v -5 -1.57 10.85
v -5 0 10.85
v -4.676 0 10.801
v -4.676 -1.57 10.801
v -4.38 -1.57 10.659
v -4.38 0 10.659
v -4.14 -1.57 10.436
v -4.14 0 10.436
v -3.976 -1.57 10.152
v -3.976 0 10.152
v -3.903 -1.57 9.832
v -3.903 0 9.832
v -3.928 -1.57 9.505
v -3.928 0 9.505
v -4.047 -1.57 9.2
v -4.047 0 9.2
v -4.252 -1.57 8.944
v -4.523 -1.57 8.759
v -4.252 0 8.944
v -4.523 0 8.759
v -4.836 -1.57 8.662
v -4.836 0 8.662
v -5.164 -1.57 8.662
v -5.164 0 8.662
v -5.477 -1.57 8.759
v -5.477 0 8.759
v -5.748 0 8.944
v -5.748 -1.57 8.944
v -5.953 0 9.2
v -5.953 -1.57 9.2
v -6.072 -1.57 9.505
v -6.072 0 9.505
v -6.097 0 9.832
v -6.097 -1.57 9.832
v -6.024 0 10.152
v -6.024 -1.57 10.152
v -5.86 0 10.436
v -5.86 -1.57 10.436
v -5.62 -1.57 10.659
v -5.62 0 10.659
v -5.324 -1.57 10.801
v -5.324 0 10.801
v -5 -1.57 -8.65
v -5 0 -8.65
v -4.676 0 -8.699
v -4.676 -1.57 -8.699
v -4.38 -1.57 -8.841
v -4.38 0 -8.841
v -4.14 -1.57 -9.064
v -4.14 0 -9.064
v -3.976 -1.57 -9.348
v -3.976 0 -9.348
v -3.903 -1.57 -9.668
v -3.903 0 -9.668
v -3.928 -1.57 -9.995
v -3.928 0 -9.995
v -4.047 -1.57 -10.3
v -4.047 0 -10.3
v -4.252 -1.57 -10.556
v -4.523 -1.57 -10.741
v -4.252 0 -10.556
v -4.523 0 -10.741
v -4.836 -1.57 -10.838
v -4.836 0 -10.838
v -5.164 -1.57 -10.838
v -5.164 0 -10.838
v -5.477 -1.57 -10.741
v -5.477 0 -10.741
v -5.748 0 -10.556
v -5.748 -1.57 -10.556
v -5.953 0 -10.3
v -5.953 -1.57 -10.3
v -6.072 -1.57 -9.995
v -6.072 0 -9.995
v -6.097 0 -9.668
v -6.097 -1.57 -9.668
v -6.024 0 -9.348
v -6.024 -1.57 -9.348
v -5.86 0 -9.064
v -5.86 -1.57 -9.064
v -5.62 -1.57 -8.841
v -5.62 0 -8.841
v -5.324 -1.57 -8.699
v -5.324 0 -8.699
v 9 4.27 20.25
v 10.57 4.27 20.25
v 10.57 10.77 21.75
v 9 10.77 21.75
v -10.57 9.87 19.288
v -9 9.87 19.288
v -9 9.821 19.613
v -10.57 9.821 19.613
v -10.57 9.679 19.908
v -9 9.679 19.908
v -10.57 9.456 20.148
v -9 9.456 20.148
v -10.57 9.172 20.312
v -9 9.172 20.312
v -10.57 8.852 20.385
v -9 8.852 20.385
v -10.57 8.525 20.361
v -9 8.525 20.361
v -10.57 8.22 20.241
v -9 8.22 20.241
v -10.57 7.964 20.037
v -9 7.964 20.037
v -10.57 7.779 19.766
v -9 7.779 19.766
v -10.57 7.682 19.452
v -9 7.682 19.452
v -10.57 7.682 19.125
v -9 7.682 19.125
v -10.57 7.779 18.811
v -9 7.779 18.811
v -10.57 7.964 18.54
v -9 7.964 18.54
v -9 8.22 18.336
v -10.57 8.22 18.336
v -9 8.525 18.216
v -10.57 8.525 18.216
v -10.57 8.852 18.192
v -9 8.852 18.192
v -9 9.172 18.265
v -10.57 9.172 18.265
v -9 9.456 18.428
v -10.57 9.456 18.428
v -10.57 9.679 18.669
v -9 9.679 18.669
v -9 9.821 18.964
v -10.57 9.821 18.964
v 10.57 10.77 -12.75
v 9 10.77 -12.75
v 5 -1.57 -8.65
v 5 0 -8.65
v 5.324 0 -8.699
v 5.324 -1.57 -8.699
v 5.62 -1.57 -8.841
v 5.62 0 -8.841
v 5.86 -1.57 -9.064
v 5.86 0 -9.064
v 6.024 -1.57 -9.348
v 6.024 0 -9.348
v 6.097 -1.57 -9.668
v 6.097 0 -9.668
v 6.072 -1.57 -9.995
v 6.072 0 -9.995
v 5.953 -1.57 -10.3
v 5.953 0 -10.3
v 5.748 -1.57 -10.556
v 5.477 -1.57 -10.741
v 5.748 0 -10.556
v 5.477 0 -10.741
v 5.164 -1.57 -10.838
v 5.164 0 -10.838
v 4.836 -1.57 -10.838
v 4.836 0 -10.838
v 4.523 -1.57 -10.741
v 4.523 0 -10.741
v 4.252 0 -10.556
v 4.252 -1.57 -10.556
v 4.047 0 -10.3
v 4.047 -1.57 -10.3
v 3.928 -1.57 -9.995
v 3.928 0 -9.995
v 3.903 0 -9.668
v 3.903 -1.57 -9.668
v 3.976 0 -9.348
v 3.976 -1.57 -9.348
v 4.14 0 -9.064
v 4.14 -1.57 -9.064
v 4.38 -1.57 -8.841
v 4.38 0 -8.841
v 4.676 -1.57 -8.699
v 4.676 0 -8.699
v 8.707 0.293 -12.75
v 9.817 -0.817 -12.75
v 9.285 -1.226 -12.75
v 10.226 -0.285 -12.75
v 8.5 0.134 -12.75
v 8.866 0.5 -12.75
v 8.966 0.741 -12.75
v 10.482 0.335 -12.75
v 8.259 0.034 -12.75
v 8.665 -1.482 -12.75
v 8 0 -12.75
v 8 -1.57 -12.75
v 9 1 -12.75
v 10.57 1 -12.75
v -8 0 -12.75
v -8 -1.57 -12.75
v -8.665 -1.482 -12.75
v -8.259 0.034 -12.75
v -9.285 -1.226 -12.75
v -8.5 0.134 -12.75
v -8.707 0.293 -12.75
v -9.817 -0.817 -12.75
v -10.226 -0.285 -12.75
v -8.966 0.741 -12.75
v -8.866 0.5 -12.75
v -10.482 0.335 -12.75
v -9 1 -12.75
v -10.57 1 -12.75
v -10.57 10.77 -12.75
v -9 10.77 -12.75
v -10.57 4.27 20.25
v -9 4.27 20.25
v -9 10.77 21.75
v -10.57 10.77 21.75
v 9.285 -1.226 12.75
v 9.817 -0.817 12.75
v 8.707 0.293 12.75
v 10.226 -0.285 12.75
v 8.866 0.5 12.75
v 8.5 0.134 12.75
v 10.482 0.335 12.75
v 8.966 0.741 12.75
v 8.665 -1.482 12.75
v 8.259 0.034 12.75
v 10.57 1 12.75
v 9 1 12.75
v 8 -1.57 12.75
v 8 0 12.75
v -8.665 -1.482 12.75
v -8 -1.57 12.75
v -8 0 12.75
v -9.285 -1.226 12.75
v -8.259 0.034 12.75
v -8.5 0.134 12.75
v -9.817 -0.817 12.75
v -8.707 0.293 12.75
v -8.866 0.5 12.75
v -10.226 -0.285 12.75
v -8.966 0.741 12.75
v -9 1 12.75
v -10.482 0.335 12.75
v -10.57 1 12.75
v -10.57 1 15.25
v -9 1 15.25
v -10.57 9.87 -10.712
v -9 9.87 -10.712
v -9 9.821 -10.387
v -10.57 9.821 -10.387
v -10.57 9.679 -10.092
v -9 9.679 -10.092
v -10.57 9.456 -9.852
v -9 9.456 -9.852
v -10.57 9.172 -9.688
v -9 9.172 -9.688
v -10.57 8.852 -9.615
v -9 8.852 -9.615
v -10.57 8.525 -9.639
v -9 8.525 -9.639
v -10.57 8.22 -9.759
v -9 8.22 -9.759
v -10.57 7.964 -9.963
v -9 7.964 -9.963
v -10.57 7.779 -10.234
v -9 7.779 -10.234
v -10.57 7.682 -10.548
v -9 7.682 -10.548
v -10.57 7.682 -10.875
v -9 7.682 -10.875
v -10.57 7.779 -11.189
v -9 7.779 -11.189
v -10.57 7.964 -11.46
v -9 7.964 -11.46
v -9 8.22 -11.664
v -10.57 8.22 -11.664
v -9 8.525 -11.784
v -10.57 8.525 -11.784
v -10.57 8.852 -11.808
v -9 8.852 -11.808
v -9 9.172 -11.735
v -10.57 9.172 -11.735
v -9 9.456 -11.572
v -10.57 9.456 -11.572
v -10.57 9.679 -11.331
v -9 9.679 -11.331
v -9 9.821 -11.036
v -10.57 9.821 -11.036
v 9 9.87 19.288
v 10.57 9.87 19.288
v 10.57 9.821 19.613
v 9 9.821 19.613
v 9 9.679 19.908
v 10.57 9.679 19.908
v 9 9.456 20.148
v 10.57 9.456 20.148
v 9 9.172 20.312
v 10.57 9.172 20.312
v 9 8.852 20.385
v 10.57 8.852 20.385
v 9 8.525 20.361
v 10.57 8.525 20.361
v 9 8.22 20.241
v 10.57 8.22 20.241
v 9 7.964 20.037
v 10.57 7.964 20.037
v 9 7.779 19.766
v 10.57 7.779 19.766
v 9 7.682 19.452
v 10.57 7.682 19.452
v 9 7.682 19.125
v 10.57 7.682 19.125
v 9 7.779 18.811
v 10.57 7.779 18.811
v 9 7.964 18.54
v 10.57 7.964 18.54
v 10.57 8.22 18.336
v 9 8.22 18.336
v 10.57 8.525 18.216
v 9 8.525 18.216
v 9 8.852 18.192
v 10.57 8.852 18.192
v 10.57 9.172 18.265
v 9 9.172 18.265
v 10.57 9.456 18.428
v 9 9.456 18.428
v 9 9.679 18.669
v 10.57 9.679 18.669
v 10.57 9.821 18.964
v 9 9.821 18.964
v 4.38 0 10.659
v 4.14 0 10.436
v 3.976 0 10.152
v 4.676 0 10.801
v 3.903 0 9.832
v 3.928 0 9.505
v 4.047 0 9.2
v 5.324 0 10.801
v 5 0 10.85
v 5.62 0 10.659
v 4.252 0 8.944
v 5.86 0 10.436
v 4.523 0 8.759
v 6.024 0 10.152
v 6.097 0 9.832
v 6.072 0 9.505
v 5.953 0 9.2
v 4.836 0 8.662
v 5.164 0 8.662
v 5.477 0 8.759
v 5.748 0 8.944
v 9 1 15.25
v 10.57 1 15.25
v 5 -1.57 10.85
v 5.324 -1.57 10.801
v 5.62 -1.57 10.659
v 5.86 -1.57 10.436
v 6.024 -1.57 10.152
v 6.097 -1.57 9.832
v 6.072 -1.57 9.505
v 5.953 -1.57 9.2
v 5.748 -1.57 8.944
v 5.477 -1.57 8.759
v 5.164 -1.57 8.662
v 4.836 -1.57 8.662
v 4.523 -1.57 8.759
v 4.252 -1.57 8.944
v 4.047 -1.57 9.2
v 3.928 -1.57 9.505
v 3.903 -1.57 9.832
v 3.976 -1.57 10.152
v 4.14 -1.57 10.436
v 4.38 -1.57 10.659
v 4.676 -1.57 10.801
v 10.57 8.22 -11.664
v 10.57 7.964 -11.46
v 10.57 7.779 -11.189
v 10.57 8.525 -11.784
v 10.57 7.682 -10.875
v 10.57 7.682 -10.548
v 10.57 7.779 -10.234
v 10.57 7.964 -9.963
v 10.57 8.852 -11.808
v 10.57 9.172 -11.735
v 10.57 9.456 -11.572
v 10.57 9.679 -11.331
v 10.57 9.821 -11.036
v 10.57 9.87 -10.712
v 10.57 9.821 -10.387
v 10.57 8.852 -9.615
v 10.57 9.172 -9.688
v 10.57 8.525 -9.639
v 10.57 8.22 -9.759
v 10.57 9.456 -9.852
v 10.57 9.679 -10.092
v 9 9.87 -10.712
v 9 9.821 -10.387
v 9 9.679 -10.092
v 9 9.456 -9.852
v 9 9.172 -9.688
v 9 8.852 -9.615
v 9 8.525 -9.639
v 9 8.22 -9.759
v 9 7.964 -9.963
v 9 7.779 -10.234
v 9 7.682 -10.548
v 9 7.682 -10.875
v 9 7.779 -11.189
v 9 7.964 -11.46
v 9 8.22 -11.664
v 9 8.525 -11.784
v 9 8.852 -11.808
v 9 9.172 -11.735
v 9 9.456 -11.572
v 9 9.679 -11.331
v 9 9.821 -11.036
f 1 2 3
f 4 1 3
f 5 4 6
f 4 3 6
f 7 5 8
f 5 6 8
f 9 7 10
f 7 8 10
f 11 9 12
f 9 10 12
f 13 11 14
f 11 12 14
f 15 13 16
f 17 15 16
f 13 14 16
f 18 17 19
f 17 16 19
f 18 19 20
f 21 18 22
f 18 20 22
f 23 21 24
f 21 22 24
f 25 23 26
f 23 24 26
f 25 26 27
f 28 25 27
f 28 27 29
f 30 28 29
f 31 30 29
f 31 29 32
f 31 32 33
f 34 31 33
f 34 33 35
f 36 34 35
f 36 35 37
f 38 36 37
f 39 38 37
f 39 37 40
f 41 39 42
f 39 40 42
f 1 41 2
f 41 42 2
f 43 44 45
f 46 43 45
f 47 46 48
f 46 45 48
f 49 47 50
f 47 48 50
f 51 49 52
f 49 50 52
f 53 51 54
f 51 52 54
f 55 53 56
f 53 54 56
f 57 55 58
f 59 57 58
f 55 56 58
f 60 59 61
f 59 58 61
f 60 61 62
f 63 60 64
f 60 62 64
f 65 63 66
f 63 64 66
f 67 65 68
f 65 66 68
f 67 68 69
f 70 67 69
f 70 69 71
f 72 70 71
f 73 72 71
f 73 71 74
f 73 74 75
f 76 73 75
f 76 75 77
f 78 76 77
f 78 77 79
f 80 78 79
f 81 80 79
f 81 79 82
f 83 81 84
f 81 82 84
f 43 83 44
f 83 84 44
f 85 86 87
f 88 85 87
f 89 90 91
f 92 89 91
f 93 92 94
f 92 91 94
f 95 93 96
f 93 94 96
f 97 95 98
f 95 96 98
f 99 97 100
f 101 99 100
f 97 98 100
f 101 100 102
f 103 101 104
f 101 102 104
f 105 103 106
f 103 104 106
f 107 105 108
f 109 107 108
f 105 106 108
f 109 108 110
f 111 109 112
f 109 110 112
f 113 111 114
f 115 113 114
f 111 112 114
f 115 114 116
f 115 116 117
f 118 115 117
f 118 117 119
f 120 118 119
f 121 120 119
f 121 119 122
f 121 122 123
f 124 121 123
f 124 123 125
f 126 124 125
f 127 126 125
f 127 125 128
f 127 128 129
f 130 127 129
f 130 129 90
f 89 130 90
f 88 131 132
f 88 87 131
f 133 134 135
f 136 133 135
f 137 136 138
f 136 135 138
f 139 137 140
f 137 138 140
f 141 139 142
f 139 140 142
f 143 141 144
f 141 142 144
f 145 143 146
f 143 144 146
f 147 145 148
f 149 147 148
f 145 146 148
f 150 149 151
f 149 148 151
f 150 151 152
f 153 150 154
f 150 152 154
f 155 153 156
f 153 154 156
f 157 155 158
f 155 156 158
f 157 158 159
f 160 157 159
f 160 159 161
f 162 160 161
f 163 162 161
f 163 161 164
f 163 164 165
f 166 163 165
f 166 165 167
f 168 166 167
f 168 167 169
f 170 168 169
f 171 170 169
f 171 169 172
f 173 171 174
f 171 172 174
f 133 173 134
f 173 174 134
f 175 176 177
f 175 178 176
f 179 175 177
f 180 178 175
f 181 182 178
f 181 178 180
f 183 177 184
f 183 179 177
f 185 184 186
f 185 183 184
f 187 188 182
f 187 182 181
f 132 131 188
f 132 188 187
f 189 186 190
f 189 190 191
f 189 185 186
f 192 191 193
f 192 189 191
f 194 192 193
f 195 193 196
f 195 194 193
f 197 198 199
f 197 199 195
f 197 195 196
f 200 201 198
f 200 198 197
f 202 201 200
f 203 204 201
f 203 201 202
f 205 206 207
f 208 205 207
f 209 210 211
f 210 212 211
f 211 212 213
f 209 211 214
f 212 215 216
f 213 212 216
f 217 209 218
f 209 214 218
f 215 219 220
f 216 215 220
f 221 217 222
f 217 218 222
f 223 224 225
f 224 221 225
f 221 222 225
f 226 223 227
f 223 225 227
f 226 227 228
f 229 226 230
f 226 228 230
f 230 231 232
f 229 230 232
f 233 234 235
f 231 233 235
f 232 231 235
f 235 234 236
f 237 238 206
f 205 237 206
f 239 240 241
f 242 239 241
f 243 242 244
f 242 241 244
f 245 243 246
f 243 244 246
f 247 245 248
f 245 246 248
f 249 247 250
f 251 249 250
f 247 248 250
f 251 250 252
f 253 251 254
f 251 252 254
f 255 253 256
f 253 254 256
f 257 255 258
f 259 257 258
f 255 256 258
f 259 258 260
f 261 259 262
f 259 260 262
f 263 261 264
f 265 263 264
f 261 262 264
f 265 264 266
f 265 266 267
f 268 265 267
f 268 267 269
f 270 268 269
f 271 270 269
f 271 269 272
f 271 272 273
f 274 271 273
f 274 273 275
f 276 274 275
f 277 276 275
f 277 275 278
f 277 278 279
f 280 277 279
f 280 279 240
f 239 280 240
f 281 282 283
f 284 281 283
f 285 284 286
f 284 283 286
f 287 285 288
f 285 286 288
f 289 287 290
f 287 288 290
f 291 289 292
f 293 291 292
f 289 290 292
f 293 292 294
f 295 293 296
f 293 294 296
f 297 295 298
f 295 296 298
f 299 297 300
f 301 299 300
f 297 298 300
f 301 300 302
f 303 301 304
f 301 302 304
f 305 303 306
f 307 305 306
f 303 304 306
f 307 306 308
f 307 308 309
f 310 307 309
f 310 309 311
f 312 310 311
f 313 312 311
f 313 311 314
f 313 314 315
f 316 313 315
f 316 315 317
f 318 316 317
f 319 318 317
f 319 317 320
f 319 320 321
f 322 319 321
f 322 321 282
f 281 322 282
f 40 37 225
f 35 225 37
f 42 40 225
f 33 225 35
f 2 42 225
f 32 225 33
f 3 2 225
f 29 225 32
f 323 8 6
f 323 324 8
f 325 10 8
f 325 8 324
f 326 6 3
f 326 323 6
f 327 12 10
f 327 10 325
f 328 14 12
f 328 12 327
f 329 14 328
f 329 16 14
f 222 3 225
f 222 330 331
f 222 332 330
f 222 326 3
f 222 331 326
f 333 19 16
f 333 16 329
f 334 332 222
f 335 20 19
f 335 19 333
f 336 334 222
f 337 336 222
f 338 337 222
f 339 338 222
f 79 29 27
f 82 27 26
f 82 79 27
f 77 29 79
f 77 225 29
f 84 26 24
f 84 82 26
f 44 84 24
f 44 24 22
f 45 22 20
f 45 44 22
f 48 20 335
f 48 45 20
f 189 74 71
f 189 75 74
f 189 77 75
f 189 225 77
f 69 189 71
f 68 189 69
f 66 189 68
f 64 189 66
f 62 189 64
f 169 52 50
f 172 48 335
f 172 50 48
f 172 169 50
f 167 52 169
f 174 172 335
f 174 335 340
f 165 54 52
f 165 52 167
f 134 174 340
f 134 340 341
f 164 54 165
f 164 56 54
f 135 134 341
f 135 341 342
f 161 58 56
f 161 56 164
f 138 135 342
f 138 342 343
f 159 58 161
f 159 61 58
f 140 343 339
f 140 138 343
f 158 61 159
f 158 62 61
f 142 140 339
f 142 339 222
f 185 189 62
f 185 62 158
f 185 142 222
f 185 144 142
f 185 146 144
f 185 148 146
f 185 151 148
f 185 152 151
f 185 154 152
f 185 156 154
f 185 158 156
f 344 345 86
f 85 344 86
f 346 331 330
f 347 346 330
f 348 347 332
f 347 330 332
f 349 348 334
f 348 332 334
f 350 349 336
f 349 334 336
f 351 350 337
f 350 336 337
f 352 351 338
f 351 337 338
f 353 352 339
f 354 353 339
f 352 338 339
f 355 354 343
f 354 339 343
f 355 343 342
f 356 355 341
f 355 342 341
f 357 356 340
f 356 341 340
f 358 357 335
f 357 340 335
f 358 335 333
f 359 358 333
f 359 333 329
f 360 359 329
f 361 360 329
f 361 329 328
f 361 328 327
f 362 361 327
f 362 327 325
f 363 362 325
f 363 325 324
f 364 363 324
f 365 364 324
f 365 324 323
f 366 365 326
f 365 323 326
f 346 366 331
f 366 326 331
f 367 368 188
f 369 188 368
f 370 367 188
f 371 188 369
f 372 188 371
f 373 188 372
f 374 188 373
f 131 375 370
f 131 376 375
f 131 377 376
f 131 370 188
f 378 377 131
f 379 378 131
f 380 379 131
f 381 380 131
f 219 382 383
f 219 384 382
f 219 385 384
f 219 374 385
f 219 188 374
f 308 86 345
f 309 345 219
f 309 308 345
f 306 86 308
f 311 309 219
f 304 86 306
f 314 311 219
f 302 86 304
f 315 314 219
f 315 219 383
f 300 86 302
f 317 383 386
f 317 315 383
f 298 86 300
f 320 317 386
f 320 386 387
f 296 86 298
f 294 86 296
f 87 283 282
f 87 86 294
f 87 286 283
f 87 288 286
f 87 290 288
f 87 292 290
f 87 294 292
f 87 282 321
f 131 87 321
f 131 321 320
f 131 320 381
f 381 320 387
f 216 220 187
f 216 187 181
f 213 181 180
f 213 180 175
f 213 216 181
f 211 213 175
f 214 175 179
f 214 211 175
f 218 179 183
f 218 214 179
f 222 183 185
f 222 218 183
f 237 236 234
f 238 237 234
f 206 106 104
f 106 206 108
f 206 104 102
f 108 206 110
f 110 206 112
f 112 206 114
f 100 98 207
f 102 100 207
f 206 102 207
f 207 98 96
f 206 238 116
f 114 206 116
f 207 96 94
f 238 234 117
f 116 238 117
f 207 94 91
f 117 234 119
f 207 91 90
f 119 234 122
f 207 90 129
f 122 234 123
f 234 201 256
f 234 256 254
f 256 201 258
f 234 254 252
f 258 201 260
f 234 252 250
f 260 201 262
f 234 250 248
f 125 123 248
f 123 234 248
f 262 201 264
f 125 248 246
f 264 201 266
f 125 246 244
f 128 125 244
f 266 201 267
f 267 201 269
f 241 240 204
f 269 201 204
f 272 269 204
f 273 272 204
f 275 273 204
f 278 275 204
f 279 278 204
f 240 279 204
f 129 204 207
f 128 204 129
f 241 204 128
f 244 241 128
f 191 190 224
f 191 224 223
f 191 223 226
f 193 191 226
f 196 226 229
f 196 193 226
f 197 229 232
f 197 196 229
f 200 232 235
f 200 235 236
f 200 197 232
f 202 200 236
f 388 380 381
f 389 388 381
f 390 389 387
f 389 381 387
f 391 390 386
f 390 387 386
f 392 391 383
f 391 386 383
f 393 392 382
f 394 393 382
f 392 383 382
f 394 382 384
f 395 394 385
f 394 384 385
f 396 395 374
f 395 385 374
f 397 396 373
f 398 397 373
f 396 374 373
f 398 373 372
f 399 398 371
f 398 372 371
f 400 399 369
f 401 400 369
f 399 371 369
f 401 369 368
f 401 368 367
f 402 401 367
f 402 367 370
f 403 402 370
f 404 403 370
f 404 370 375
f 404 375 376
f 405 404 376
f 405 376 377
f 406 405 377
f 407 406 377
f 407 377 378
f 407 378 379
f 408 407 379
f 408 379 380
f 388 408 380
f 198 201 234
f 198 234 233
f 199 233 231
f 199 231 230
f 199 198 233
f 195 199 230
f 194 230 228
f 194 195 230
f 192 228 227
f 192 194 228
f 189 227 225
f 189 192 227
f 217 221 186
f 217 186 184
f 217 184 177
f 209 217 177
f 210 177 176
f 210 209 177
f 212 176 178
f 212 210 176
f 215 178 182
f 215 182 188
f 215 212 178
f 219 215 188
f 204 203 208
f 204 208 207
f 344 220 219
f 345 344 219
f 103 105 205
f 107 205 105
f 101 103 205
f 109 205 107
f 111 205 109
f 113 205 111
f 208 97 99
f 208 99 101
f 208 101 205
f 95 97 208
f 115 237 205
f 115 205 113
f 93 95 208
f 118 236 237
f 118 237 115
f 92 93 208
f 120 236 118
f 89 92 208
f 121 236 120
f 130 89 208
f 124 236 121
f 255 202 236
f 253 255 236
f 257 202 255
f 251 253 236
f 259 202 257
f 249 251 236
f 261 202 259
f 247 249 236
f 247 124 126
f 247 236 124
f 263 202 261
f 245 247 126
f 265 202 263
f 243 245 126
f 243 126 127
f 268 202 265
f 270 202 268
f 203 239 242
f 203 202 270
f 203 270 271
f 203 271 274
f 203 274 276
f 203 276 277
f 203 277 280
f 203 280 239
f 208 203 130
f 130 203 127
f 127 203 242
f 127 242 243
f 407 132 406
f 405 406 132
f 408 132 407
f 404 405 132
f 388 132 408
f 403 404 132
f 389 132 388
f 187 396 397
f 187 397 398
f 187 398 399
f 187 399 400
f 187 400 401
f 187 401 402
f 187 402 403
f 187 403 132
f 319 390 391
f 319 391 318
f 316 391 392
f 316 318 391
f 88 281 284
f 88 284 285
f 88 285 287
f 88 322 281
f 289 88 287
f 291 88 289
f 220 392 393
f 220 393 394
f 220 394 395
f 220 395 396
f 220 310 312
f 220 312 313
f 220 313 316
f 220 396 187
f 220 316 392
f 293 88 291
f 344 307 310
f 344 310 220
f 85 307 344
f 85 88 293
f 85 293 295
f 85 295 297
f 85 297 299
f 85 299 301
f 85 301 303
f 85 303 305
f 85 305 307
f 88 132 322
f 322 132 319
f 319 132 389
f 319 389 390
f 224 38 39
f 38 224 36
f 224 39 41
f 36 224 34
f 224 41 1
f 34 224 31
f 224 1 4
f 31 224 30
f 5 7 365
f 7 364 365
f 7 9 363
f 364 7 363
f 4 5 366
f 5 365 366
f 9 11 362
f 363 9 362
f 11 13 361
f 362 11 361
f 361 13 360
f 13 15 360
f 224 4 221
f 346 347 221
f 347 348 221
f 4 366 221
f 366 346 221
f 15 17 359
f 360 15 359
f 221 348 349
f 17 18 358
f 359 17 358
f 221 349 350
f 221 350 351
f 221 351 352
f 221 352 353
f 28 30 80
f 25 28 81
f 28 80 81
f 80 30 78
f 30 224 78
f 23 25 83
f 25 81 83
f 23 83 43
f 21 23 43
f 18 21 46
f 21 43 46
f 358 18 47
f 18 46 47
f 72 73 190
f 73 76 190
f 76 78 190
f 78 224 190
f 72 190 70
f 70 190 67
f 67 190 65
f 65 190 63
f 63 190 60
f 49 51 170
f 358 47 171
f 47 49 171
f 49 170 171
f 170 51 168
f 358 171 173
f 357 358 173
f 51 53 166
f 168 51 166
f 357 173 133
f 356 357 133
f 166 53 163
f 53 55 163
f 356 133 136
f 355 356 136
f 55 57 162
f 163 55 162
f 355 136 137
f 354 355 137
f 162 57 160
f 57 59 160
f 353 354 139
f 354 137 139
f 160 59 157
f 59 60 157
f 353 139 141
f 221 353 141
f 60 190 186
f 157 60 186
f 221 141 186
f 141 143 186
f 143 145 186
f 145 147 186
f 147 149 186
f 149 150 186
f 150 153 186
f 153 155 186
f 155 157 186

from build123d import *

# Parameters (mm, degrees)
SKETCH1_W           = 16
SKETCH1_H           = 25.5
SKETCH1_R           = 1.1
BASE_FLANGE1_DEPTH  = 1.57
EDGE_FLANGE2_DEPTH  = 25.5
EDGE_FLANGE3_DEPTH  = 25.5
SKETCH23_W          = 1.57
SKETCH23_H          = 9.77
BOSS_EXTRUDE1_DEPTH = 9
CUT_EXTRUDE1_DEPTH  = 33.18625483
SKETCH29_R          = 1.1
CUT_EXTRUDE2_DEPTH  = 33.18625483


# Sheet-metal steps are written as plain solids
with BuildPart() as part:
    # Sketch1 → Base-Flange1 (new body)
    with BuildSketch(Plane(origin=(0, 0, 0), x_dir=(1, 0, 0), z_dir=(0, 1, 0))):
        Rectangle(SKETCH1_W, SKETCH1_H)
        with Locations(Location((-5, 9.75, 0), (0, 0, 270))):
            Circle(SKETCH1_R, mode=Mode.SUBTRACT)
        with Locations(Location((5, 9.75, 0), (0, 0, 270))):
            Circle(SKETCH1_R, mode=Mode.SUBTRACT)
        with Locations(Location((-5, -9.75, 0), (0, 0, 270))):
            Circle(SKETCH1_R, mode=Mode.SUBTRACT)
        with Locations(Location((5, -9.75, 0), (0, 0, 270))):
            Circle(SKETCH1_R, mode=Mode.SUBTRACT)
    extrude(amount=-BASE_FLANGE1_DEPTH)

    # Edge-Flange2 section (across the edge) → Edge-Flange2 (add)
    with BuildSketch(Plane(origin=(9, 0, 12.75), x_dir=(-1, 0, 0), z_dir=(0, 0, -1))):
        with BuildLine():
            Line((-1.57, 1), (-1.57, 10.77))
            Line((-1.57, 10.77), (0, 10.77))
            Line((0, 10.77), (0, 1))
            ThreePointArc((0, 1), (0.292893219, 0.292893219), (1, 0))
            Line((1, 0), (1, -1.57))
            ThreePointArc((1, -1.57), (-0.817264428, -0.817264428), (-1.57, 1))
        make_face()
    extrude(amount=EDGE_FLANGE2_DEPTH)

    # Edge-Flange3 section (across the edge) → Edge-Flange3 (add)
    with BuildSketch(Plane(origin=(-9, 0, -12.75), x_dir=(1, 0, 0), z_dir=(0, 0, 1))):
        with BuildLine():
            Line((-1.57, 1), (-1.57, 10.77))
            Line((-1.57, 10.77), (0, 10.77))
            Line((0, 10.77), (0, 1))
            ThreePointArc((0, 1), (0.292893219, 0.292893219), (1, 0))
            Line((1, 0), (1, -1.57))
            ThreePointArc((1, -1.57), (-0.817264428, -0.817264428), (-1.57, 1))
        make_face()
    extrude(amount=EDGE_FLANGE3_DEPTH)

    # Sketch23 → Boss-Extrude1 (add)
    with BuildSketch(Plane.XY.offset(12.75)):
        with Locations((-9.785, 5.885)):
            Rectangle(SKETCH23_W, SKETCH23_H)
        with Locations((9.785, 5.885)):
            Rectangle(SKETCH23_W, SKETCH23_H)
    extrude(amount=BOSS_EXTRUDE1_DEPTH)

    # Sketch24 → Cut-Extrude1 (cut, through all)
    with BuildSketch(Plane(origin=(10.57, 0, 0), x_dir=(0, 0, -1), z_dir=(1, 0, 0))):
        Polygon((-21.75, 10.77), (-21.75, 1), (-15.25, 1), (-20.25, 4.27), align=None)
    extrude(amount=-CUT_EXTRUDE1_DEPTH, mode=Mode.SUBTRACT)

    # Sketch29 → Cut-Extrude2 (cut, through all)
    with BuildSketch(Plane(origin=(10.57, 0, 0), x_dir=(0, 0, -1), z_dir=(1, 0, 0))):
        with Locations(Location((-19.288461538, 8.77, 0), (0, 0, 90))):
            Circle(SKETCH29_R)
        with Locations(Location((10.711538462, 8.77, 0), (0, 0, 90))):
            Circle(SKETCH29_R)
    extrude(amount=-CUT_EXTRUDE2_DEPTH, mode=Mode.SUBTRACT)


solid = part.part
